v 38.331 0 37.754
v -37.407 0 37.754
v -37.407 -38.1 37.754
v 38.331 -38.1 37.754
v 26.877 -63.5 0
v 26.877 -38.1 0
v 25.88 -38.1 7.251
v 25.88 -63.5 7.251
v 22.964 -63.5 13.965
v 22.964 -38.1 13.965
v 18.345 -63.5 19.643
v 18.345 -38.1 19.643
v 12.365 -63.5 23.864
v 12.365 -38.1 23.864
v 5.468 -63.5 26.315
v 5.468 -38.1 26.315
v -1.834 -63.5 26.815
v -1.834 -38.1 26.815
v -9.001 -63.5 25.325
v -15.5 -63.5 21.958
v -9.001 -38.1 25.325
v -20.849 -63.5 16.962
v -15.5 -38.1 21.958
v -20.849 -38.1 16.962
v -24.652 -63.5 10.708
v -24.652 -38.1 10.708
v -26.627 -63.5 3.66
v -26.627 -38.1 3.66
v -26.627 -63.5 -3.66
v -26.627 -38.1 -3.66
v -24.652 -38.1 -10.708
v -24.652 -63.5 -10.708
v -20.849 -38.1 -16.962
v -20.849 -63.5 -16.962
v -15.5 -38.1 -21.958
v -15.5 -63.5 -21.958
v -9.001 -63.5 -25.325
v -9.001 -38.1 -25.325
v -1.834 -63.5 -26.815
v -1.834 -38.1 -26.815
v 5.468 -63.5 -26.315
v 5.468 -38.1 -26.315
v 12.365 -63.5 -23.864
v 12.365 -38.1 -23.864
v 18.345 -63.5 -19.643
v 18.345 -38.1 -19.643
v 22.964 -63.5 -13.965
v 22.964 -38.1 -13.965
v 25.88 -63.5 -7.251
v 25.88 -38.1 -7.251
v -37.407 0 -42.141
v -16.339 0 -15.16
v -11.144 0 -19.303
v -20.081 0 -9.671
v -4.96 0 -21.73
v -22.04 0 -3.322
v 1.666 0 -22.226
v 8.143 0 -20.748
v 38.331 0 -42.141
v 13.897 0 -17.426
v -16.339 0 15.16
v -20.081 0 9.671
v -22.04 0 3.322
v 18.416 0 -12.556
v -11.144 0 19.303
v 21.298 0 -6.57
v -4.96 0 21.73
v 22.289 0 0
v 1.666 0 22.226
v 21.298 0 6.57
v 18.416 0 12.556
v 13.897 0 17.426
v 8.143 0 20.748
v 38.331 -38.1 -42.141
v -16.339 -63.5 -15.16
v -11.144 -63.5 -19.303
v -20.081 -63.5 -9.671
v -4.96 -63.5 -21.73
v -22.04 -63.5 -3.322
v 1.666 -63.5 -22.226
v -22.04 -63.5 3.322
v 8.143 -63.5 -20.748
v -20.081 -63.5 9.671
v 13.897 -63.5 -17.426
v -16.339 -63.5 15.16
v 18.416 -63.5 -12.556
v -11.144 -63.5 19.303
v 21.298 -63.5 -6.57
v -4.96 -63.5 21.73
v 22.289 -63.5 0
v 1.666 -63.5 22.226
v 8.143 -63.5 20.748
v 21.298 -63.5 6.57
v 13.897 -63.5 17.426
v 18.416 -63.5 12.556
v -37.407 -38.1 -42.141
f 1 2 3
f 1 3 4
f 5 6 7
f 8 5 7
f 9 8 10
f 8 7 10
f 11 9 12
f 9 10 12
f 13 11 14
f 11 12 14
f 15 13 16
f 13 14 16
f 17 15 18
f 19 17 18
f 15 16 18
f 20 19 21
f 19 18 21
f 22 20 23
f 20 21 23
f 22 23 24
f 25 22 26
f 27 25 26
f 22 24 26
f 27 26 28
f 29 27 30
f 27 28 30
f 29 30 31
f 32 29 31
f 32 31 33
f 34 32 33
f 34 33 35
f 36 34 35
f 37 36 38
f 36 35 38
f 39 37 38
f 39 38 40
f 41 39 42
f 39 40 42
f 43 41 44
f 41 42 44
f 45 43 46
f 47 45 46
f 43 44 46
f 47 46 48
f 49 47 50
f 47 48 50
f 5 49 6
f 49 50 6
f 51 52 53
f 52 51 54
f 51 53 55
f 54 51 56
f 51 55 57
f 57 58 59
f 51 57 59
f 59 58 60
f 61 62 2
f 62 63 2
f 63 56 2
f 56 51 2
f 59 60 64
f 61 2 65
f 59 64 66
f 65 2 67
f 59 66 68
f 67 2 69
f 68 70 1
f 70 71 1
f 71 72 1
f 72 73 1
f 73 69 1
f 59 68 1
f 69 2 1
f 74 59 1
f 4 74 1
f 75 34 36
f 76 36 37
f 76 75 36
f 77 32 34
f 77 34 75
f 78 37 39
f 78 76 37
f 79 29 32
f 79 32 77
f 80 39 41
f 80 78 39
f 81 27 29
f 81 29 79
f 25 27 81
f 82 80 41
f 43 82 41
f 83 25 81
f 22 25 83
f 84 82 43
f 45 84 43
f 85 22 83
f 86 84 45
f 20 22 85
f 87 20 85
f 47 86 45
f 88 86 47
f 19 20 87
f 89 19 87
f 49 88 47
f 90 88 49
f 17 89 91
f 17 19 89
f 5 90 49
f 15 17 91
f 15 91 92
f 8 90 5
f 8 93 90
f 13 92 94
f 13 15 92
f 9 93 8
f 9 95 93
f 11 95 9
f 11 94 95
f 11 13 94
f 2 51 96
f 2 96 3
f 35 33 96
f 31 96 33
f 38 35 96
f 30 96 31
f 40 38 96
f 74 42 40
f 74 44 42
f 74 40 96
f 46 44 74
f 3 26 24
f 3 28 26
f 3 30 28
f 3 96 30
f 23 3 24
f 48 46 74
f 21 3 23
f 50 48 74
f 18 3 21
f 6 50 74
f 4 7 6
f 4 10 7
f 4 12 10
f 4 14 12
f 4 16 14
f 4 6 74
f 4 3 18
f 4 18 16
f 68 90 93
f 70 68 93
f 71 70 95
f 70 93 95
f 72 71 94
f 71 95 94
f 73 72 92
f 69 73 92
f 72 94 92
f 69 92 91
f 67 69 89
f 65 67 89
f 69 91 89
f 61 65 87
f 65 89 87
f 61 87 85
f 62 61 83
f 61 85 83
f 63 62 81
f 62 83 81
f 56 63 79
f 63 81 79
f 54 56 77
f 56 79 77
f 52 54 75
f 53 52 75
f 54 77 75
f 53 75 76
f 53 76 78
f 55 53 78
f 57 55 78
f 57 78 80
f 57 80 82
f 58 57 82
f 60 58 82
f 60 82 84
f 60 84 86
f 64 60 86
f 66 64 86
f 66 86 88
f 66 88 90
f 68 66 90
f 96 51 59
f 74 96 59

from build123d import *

# Parameters (mm, degrees)
F0_W     = 75.738185
F0_H     = 79.894543
F1_DEPTH = 38.1
F2_R     = 26.877172
F3_DEPTH = 25.4
F4_R     = 22.28871
F5_DEPTH = 63.501


with BuildPart() as f1:
    # F0 (on Front) → F1 (new body)
    with BuildSketch(Plane.XZ):
        with Locations((0.46182, -2.193634)):
            Rectangle(F0_W, F0_H)
    extrude(amount=F1_DEPTH)

    # F2 (on face) → F3 (join)
    with BuildSketch(Plane.XZ.offset(38.1)):
        Circle(F2_R)
    extrude(amount=F3_DEPTH)

    # F4 (on face) → F5 (cut, through all)
    with BuildSketch(Plane.XZ.offset(63.5)):
        Circle(F4_R)
    extrude(amount=-F5_DEPTH, mode=Mode.SUBTRACT)


solid = f1.part
